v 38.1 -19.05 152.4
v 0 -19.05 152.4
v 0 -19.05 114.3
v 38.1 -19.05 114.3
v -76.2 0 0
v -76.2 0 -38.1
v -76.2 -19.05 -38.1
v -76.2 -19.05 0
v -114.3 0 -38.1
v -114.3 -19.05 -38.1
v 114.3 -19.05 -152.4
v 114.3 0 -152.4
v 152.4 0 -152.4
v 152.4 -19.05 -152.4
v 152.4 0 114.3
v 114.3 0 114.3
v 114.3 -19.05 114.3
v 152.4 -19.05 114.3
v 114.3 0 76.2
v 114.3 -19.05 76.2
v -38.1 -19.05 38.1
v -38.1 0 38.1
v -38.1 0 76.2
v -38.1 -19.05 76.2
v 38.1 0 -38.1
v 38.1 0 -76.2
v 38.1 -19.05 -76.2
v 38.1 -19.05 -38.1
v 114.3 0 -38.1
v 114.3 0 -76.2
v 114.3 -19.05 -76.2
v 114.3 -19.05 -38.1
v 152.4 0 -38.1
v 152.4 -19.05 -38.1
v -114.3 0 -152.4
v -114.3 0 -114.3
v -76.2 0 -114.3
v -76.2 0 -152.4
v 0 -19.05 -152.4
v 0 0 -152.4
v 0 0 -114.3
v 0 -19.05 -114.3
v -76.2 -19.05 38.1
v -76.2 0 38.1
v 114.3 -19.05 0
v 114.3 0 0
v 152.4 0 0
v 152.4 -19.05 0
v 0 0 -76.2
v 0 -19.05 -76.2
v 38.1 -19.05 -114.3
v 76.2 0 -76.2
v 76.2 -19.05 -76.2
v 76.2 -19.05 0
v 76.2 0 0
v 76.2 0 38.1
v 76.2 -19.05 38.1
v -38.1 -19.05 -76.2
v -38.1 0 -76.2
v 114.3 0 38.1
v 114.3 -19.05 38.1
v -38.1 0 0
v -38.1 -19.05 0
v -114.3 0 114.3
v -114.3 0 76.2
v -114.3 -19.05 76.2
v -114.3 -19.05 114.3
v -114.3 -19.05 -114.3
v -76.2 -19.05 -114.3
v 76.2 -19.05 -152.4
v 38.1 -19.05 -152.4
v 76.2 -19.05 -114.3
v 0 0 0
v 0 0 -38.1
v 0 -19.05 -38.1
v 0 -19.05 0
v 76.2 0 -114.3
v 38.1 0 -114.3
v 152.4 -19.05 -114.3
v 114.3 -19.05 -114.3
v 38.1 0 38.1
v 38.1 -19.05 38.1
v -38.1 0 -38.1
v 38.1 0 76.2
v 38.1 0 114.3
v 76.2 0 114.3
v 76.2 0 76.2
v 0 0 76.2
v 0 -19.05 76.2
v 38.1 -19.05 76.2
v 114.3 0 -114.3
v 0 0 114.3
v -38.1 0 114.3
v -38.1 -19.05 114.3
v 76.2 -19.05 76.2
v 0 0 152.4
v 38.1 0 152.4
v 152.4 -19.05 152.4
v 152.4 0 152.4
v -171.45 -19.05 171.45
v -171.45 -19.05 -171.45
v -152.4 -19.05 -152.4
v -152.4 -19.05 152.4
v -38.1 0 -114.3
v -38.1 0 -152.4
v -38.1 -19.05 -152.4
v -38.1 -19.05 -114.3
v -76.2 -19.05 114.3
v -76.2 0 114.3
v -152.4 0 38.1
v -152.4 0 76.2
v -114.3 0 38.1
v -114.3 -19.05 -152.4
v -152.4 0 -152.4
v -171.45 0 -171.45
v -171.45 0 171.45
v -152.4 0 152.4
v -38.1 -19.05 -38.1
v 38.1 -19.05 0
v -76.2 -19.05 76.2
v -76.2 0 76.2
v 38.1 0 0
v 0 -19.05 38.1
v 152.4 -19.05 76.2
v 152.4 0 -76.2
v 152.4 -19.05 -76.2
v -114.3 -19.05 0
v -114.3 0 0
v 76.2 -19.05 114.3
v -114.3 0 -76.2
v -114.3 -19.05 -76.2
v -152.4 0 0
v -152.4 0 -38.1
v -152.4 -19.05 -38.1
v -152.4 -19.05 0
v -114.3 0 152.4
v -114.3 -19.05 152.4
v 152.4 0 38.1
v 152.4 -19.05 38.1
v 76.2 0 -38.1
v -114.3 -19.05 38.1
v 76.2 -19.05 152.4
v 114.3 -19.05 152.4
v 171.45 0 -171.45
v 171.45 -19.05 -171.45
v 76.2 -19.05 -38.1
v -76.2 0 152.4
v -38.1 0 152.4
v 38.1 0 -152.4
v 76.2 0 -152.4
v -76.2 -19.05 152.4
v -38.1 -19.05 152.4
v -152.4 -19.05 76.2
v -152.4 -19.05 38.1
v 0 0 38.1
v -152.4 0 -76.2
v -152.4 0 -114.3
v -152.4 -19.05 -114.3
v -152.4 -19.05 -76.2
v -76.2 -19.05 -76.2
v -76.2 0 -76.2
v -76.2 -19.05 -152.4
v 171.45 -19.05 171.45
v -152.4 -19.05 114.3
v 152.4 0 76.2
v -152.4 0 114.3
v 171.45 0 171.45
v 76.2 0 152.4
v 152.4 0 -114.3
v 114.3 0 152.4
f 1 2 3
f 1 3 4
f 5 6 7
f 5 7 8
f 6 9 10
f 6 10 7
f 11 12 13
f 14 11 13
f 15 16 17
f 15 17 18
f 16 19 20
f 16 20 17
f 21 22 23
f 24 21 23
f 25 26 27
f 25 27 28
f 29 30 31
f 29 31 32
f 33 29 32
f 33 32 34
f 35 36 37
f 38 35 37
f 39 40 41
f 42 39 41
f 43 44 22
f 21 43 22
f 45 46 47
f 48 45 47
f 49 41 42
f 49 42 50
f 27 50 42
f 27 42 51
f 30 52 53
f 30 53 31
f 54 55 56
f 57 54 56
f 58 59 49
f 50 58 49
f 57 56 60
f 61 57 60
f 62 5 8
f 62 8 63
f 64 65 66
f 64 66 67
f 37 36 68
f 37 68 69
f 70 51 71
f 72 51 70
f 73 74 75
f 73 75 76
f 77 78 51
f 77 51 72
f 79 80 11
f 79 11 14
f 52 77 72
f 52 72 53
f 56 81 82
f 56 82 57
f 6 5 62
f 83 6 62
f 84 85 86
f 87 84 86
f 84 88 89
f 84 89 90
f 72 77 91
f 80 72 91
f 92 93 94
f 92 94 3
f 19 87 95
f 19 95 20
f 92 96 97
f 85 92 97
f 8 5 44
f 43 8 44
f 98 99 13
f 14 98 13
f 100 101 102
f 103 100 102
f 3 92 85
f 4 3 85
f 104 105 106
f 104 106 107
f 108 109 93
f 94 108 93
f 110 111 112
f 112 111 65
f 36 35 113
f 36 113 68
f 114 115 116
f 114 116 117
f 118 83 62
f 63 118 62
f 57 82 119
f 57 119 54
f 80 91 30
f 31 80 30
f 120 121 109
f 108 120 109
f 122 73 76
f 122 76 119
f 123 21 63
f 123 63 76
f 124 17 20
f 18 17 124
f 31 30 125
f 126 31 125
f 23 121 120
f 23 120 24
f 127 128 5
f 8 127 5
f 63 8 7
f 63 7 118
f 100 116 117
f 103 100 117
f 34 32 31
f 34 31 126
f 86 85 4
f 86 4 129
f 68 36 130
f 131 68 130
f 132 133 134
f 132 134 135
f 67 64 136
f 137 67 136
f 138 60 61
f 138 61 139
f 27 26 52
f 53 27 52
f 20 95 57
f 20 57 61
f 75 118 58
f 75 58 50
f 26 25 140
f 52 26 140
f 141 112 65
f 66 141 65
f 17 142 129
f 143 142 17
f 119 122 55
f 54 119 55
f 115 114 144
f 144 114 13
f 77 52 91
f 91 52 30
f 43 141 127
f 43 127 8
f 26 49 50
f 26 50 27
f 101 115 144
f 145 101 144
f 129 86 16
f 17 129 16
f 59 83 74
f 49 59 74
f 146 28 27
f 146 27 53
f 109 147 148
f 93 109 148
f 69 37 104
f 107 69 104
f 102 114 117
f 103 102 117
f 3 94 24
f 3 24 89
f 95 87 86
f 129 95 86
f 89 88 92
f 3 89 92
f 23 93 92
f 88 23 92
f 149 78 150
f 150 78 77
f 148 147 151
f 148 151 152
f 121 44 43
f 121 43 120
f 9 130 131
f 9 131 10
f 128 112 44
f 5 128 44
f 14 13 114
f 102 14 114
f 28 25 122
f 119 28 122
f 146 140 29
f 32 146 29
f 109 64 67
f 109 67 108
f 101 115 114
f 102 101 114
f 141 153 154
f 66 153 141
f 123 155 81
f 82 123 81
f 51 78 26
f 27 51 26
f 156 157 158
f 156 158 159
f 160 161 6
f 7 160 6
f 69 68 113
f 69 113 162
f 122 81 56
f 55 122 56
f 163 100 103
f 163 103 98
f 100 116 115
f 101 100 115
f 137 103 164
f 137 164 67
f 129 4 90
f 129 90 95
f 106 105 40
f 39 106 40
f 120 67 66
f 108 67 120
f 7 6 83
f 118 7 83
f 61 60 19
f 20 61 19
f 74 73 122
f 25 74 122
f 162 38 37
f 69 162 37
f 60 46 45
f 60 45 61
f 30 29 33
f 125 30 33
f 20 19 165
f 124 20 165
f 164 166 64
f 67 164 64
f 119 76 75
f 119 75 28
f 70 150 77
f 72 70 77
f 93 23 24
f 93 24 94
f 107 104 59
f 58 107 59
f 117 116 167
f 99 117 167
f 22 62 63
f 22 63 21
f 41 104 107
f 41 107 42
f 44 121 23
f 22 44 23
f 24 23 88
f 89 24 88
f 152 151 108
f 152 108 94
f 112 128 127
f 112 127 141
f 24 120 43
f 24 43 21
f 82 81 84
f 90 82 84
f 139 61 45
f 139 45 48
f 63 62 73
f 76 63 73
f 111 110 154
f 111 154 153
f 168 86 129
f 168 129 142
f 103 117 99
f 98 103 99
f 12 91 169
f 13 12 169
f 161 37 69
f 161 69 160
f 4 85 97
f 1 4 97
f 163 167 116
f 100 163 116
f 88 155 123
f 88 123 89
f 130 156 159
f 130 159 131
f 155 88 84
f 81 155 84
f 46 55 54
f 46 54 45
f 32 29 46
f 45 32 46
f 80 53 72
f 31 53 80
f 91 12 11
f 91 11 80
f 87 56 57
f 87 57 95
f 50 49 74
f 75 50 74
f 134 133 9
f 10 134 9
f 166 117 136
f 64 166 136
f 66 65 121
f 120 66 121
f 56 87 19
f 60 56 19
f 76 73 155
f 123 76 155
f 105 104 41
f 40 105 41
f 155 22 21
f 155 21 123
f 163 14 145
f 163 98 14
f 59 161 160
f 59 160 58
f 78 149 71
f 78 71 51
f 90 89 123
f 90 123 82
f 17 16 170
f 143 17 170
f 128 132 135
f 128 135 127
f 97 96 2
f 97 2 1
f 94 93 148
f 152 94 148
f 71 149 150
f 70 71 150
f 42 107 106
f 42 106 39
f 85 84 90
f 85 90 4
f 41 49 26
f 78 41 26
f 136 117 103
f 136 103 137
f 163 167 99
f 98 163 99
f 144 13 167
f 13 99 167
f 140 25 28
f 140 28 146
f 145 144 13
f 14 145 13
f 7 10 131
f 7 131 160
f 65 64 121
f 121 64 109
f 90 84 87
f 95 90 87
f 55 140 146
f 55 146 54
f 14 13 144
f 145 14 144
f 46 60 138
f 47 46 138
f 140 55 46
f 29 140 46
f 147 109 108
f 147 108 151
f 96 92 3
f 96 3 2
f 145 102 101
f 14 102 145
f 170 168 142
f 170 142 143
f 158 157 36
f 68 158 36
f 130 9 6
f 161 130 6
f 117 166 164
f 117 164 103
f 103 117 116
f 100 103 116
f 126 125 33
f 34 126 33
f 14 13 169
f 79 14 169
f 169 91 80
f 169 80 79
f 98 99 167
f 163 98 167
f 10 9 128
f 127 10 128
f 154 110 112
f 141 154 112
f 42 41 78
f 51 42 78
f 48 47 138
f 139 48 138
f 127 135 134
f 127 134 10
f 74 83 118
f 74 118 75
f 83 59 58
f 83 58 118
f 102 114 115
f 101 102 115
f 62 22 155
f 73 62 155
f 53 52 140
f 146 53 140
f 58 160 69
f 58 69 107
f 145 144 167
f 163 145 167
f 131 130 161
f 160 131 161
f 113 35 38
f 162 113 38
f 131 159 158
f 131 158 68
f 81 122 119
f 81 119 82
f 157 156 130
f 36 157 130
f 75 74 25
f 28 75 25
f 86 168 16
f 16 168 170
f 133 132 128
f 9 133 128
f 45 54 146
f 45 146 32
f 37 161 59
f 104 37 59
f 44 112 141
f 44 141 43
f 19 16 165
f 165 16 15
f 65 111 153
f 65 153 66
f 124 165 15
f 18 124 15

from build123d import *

# Parameters (mm, degrees)
F2_DEPTH = 19.05
F3_DEPTH = 19.05
F4_DEPTH = 19.05
F5_DEPTH = 19.05
F6_W     = 38.1
F6_H     = 38.1
F7_DEPTH = 19.05


with BuildPart() as f2:
    # F1 (on Front) → F2 (new body)
    with BuildSketch(Plane.XZ):
        Polygon((-171.45, 171.45), (-171.45, -171.45), (-152.4, -152.4), (-152.4, 152.4), align=None)
    extrude(amount=F2_DEPTH)


with BuildPart() as f3:
    # F1 (on Front) → F3 (new body)
    with BuildSketch(Plane.XZ):
        Polygon((-171.45, -171.45), (171.45, -171.45), (152.4, -152.4), (-152.4, -152.4), align=None)
    extrude(amount=F3_DEPTH)


with BuildPart() as f4:
    # F1 (on Front) → F4 (new body)
    with BuildSketch(Plane.XZ):
        Polygon((152.4, 152.4), (171.45, 171.45), (-171.45, 171.45), (-152.4, 152.4), align=None)
    extrude(amount=F4_DEPTH)


with BuildPart() as f5:
    # F1 (on Front) → F5 (new body)
    with BuildSketch(Plane.XZ):
        Polygon((152.4, -152.4), (171.45, -171.45), (171.45, 171.45), (152.4, 152.4), align=None)
    extrude(amount=F5_DEPTH)


with BuildPart() as f7:
    # F6 (on Front) → F7 (new body)
    with BuildSketch(Plane.XZ):
        with Locations((-133.35, 133.35)):
            Rectangle(F6_W, F6_H)
    extrude(amount=F7_DEPTH)


with BuildPart() as f7b:
    # F6 (on Front) → F7, piece 2 (new body)
    with BuildSketch(Plane.XZ):
        with Locations((-133.35, 57.15)):
            Rectangle(F6_W, F6_H)
    extrude(amount=F7_DEPTH)


with BuildPart() as f7c:
    # F6 (on Front) → F7, piece 3 (new body)
    with BuildSketch(Plane.XZ):
        with Locations((-133.35, -19.05)):
            Rectangle(F6_W, F6_H)
    extrude(amount=F7_DEPTH)


with BuildPart() as f7d:
    # F6 (on Front) → F7, piece 4 (new body)
    with BuildSketch(Plane.XZ):
        with Locations((-133.35, -95.25)):
            Rectangle(F6_W, F6_H)
    extrude(amount=F7_DEPTH)


with BuildPart() as f7e:
    # F6 (on Front) → F7, piece 5 (new body)
    with BuildSketch(Plane.XZ):
        with Locations((-95.25, -133.35)):
            Rectangle(F6_W, F6_H)
    extrude(amount=F7_DEPTH)


with BuildPart() as f7f:
    # F6 (on Front) → F7, piece 6 (new body)
    with BuildSketch(Plane.XZ):
        with Locations((-95.25, -57.15)):
            Rectangle(F6_W, F6_H)
    extrude(amount=F7_DEPTH)


with BuildPart() as f7g:
    # F6 (on Front) → F7, piece 7 (new body)
    with BuildSketch(Plane.XZ):
        with Locations((-95.25, 19.05)):
            Rectangle(F6_W, F6_H)
    extrude(amount=F7_DEPTH)


with BuildPart() as f7h:
    # F6 (on Front) → F7, piece 8 (new body)
    with BuildSketch(Plane.XZ):
        with Locations((-95.25, 95.25)):
            Rectangle(F6_W, F6_H)
    extrude(amount=F7_DEPTH)


with BuildPart() as f7i:
    # F6 (on Front) → F7, piece 9 (new body)
    with BuildSketch(Plane.XZ):
        with Locations((-57.15, 133.35)):
            Rectangle(F6_W, F6_H)
    extrude(amount=F7_DEPTH)


with BuildPart() as f7j:
    # F6 (on Front) → F7, piece 10 (new body)
    with BuildSketch(Plane.XZ):
        with Locations((-57.15, 57.15)):
            Rectangle(F6_W, F6_H)
    extrude(amount=F7_DEPTH)


with BuildPart() as f7k:
    # F6 (on Front) → F7, piece 11 (new body)
    with BuildSketch(Plane.XZ):
        with Locations((-57.15, -19.05)):
            Rectangle(F6_W, F6_H)
    extrude(amount=F7_DEPTH)


with BuildPart() as f7l:
    # F6 (on Front) → F7, piece 12 (new body)
    with BuildSketch(Plane.XZ):
        with Locations((-57.15, -95.25)):
            Rectangle(F6_W, F6_H)
    extrude(amount=F7_DEPTH)


with BuildPart() as f7m:
    # F6 (on Front) → F7, piece 13 (new body)
    with BuildSketch(Plane.XZ):
        with Locations((-19.05, -133.35)):
            Rectangle(F6_W, F6_H)
    extrude(amount=F7_DEPTH)


with BuildPart() as f7n:
    # F6 (on Front) → F7, piece 14 (new body)
    with BuildSketch(Plane.XZ):
        with Locations((-19.05, -57.15)):
            Rectangle(F6_W, F6_H)
    extrude(amount=F7_DEPTH)


with BuildPart() as f7o:
    # F6 (on Front) → F7, piece 15 (new body)
    with BuildSketch(Plane.XZ):
        with Locations((-19.05, 19.05)):
            Rectangle(F6_W, F6_H)
    extrude(amount=F7_DEPTH)


with BuildPart() as f7p:
    # F6 (on Front) → F7, piece 16 (new body)
    with BuildSketch(Plane.XZ):
        with Locations((-19.05, 95.25)):
            Rectangle(F6_W, F6_H)
    extrude(amount=F7_DEPTH)


with BuildPart() as f7q:
    # F6 (on Front) → F7, piece 17 (new body)
    with BuildSketch(Plane.XZ):
        with Locations((19.05, 133.35)):
            Rectangle(F6_W, F6_H)
    extrude(amount=F7_DEPTH)


with BuildPart() as f7r:
    # F6 (on Front) → F7, piece 18 (new body)
    with BuildSketch(Plane.XZ):
        with Locations((19.05, 57.15)):
            Rectangle(F6_W, F6_H)
    extrude(amount=F7_DEPTH)


with BuildPart() as f7s:
    # F6 (on Front) → F7, piece 19 (new body)
    with BuildSketch(Plane.XZ):
        with Locations((57.15, -57.15)):
            Rectangle(F6_W, F6_H)
    extrude(amount=F7_DEPTH)


with BuildPart() as f7t:
    # F6 (on Front) → F7, piece 20 (new body)
    with BuildSketch(Plane.XZ):
        with Locations((57.15, 19.05)):
            Rectangle(F6_W, F6_H)
    extrude(amount=F7_DEPTH)


with BuildPart() as f7u:
    # F6 (on Front) → F7, piece 21 (new body)
    with BuildSketch(Plane.XZ):
        with Locations((57.15, 95.25)):
            Rectangle(F6_W, F6_H)
    extrude(amount=F7_DEPTH)


with BuildPart() as f7v:
    # F6 (on Front) → F7, piece 22 (new body)
    with BuildSketch(Plane.XZ):
        with Locations((19.05, -95.25)):
            Rectangle(F6_W, F6_H)
    extrude(amount=F7_DEPTH)


with BuildPart() as f7w:
    # F6 (on Front) → F7, piece 23 (new body)
    with BuildSketch(Plane.XZ):
        with Locations((19.05, -19.05)):
            Rectangle(F6_W, F6_H)
    extrude(amount=F7_DEPTH)


with BuildPart() as f7x:
    # F6 (on Front) → F7, piece 24 (new body)
    with BuildSketch(Plane.XZ):
        with Locations((95.25, -95.25)):
            Rectangle(F6_W, F6_H)
    extrude(amount=F7_DEPTH)


with BuildPart() as f7y:
    # F6 (on Front) → F7, piece 25 (new body)
    with BuildSketch(Plane.XZ):
        with Locations((95.25, -19.05)):
            Rectangle(F6_W, F6_H)
    extrude(amount=F7_DEPTH)


with BuildPart() as f7z:
    # F6 (on Front) → F7, piece 26 (new body)
    with BuildSketch(Plane.XZ):
        with Locations((95.25, 57.15)):
            Rectangle(F6_W, F6_H)
    extrude(amount=F7_DEPTH)


with BuildPart() as f7ba:
    # F6 (on Front) → F7, piece 27 (new body)
    with BuildSketch(Plane.XZ):
        with Locations((95.25, 133.35)):
            Rectangle(F6_W, F6_H)
    extrude(amount=F7_DEPTH)


with BuildPart() as f7bb:
    # F6 (on Front) → F7, piece 28 (new body)
    with BuildSketch(Plane.XZ):
        with Locations((133.35, 95.25)):
            Rectangle(F6_W, F6_H)
    extrude(amount=F7_DEPTH)


with BuildPart() as f7bc:
    # F6 (on Front) → F7, piece 29 (new body)
    with BuildSketch(Plane.XZ):
        with Locations((133.35, 19.05)):
            Rectangle(F6_W, F6_H)
    extrude(amount=F7_DEPTH)


with BuildPart() as f7bd:
    # F6 (on Front) → F7, piece 30 (new body)
    with BuildSketch(Plane.XZ):
        with Locations((133.35, -57.15)):
            Rectangle(F6_W, F6_H)
    extrude(amount=F7_DEPTH)


with BuildPart() as f7be:
    # F6 (on Front) → F7, piece 31 (new body)
    with BuildSketch(Plane.XZ):
        with Locations((57.15, -133.35)):
            Rectangle(F6_W, F6_H)
    extrude(amount=F7_DEPTH)


with BuildPart() as f7bf:
    # F6 (on Front) → F7, piece 32 (new body)
    with BuildSketch(Plane.XZ):
        with Locations((133.35, -133.35)):
            Rectangle(F6_W, F6_H)
    extrude(amount=F7_DEPTH)


solid = Compound([f2.part, f3.part, f4.part, f5.part, f7.part, f7b.part, f7c.part, f7d.part, f7e.part, f7f.part, f7g.part, f7h.part, f7i.part, f7j.part, f7k.part, f7l.part, f7m.part, f7n.part, f7o.part, f7p.part, f7q.part, f7r.part, f7s.part, f7t.part, f7u.part, f7v.part, f7w.part, f7x.part, f7y.part, f7z.part, f7ba.part, f7bb.part, f7bc.part, f7bd.part, f7be.part, f7bf.part])
